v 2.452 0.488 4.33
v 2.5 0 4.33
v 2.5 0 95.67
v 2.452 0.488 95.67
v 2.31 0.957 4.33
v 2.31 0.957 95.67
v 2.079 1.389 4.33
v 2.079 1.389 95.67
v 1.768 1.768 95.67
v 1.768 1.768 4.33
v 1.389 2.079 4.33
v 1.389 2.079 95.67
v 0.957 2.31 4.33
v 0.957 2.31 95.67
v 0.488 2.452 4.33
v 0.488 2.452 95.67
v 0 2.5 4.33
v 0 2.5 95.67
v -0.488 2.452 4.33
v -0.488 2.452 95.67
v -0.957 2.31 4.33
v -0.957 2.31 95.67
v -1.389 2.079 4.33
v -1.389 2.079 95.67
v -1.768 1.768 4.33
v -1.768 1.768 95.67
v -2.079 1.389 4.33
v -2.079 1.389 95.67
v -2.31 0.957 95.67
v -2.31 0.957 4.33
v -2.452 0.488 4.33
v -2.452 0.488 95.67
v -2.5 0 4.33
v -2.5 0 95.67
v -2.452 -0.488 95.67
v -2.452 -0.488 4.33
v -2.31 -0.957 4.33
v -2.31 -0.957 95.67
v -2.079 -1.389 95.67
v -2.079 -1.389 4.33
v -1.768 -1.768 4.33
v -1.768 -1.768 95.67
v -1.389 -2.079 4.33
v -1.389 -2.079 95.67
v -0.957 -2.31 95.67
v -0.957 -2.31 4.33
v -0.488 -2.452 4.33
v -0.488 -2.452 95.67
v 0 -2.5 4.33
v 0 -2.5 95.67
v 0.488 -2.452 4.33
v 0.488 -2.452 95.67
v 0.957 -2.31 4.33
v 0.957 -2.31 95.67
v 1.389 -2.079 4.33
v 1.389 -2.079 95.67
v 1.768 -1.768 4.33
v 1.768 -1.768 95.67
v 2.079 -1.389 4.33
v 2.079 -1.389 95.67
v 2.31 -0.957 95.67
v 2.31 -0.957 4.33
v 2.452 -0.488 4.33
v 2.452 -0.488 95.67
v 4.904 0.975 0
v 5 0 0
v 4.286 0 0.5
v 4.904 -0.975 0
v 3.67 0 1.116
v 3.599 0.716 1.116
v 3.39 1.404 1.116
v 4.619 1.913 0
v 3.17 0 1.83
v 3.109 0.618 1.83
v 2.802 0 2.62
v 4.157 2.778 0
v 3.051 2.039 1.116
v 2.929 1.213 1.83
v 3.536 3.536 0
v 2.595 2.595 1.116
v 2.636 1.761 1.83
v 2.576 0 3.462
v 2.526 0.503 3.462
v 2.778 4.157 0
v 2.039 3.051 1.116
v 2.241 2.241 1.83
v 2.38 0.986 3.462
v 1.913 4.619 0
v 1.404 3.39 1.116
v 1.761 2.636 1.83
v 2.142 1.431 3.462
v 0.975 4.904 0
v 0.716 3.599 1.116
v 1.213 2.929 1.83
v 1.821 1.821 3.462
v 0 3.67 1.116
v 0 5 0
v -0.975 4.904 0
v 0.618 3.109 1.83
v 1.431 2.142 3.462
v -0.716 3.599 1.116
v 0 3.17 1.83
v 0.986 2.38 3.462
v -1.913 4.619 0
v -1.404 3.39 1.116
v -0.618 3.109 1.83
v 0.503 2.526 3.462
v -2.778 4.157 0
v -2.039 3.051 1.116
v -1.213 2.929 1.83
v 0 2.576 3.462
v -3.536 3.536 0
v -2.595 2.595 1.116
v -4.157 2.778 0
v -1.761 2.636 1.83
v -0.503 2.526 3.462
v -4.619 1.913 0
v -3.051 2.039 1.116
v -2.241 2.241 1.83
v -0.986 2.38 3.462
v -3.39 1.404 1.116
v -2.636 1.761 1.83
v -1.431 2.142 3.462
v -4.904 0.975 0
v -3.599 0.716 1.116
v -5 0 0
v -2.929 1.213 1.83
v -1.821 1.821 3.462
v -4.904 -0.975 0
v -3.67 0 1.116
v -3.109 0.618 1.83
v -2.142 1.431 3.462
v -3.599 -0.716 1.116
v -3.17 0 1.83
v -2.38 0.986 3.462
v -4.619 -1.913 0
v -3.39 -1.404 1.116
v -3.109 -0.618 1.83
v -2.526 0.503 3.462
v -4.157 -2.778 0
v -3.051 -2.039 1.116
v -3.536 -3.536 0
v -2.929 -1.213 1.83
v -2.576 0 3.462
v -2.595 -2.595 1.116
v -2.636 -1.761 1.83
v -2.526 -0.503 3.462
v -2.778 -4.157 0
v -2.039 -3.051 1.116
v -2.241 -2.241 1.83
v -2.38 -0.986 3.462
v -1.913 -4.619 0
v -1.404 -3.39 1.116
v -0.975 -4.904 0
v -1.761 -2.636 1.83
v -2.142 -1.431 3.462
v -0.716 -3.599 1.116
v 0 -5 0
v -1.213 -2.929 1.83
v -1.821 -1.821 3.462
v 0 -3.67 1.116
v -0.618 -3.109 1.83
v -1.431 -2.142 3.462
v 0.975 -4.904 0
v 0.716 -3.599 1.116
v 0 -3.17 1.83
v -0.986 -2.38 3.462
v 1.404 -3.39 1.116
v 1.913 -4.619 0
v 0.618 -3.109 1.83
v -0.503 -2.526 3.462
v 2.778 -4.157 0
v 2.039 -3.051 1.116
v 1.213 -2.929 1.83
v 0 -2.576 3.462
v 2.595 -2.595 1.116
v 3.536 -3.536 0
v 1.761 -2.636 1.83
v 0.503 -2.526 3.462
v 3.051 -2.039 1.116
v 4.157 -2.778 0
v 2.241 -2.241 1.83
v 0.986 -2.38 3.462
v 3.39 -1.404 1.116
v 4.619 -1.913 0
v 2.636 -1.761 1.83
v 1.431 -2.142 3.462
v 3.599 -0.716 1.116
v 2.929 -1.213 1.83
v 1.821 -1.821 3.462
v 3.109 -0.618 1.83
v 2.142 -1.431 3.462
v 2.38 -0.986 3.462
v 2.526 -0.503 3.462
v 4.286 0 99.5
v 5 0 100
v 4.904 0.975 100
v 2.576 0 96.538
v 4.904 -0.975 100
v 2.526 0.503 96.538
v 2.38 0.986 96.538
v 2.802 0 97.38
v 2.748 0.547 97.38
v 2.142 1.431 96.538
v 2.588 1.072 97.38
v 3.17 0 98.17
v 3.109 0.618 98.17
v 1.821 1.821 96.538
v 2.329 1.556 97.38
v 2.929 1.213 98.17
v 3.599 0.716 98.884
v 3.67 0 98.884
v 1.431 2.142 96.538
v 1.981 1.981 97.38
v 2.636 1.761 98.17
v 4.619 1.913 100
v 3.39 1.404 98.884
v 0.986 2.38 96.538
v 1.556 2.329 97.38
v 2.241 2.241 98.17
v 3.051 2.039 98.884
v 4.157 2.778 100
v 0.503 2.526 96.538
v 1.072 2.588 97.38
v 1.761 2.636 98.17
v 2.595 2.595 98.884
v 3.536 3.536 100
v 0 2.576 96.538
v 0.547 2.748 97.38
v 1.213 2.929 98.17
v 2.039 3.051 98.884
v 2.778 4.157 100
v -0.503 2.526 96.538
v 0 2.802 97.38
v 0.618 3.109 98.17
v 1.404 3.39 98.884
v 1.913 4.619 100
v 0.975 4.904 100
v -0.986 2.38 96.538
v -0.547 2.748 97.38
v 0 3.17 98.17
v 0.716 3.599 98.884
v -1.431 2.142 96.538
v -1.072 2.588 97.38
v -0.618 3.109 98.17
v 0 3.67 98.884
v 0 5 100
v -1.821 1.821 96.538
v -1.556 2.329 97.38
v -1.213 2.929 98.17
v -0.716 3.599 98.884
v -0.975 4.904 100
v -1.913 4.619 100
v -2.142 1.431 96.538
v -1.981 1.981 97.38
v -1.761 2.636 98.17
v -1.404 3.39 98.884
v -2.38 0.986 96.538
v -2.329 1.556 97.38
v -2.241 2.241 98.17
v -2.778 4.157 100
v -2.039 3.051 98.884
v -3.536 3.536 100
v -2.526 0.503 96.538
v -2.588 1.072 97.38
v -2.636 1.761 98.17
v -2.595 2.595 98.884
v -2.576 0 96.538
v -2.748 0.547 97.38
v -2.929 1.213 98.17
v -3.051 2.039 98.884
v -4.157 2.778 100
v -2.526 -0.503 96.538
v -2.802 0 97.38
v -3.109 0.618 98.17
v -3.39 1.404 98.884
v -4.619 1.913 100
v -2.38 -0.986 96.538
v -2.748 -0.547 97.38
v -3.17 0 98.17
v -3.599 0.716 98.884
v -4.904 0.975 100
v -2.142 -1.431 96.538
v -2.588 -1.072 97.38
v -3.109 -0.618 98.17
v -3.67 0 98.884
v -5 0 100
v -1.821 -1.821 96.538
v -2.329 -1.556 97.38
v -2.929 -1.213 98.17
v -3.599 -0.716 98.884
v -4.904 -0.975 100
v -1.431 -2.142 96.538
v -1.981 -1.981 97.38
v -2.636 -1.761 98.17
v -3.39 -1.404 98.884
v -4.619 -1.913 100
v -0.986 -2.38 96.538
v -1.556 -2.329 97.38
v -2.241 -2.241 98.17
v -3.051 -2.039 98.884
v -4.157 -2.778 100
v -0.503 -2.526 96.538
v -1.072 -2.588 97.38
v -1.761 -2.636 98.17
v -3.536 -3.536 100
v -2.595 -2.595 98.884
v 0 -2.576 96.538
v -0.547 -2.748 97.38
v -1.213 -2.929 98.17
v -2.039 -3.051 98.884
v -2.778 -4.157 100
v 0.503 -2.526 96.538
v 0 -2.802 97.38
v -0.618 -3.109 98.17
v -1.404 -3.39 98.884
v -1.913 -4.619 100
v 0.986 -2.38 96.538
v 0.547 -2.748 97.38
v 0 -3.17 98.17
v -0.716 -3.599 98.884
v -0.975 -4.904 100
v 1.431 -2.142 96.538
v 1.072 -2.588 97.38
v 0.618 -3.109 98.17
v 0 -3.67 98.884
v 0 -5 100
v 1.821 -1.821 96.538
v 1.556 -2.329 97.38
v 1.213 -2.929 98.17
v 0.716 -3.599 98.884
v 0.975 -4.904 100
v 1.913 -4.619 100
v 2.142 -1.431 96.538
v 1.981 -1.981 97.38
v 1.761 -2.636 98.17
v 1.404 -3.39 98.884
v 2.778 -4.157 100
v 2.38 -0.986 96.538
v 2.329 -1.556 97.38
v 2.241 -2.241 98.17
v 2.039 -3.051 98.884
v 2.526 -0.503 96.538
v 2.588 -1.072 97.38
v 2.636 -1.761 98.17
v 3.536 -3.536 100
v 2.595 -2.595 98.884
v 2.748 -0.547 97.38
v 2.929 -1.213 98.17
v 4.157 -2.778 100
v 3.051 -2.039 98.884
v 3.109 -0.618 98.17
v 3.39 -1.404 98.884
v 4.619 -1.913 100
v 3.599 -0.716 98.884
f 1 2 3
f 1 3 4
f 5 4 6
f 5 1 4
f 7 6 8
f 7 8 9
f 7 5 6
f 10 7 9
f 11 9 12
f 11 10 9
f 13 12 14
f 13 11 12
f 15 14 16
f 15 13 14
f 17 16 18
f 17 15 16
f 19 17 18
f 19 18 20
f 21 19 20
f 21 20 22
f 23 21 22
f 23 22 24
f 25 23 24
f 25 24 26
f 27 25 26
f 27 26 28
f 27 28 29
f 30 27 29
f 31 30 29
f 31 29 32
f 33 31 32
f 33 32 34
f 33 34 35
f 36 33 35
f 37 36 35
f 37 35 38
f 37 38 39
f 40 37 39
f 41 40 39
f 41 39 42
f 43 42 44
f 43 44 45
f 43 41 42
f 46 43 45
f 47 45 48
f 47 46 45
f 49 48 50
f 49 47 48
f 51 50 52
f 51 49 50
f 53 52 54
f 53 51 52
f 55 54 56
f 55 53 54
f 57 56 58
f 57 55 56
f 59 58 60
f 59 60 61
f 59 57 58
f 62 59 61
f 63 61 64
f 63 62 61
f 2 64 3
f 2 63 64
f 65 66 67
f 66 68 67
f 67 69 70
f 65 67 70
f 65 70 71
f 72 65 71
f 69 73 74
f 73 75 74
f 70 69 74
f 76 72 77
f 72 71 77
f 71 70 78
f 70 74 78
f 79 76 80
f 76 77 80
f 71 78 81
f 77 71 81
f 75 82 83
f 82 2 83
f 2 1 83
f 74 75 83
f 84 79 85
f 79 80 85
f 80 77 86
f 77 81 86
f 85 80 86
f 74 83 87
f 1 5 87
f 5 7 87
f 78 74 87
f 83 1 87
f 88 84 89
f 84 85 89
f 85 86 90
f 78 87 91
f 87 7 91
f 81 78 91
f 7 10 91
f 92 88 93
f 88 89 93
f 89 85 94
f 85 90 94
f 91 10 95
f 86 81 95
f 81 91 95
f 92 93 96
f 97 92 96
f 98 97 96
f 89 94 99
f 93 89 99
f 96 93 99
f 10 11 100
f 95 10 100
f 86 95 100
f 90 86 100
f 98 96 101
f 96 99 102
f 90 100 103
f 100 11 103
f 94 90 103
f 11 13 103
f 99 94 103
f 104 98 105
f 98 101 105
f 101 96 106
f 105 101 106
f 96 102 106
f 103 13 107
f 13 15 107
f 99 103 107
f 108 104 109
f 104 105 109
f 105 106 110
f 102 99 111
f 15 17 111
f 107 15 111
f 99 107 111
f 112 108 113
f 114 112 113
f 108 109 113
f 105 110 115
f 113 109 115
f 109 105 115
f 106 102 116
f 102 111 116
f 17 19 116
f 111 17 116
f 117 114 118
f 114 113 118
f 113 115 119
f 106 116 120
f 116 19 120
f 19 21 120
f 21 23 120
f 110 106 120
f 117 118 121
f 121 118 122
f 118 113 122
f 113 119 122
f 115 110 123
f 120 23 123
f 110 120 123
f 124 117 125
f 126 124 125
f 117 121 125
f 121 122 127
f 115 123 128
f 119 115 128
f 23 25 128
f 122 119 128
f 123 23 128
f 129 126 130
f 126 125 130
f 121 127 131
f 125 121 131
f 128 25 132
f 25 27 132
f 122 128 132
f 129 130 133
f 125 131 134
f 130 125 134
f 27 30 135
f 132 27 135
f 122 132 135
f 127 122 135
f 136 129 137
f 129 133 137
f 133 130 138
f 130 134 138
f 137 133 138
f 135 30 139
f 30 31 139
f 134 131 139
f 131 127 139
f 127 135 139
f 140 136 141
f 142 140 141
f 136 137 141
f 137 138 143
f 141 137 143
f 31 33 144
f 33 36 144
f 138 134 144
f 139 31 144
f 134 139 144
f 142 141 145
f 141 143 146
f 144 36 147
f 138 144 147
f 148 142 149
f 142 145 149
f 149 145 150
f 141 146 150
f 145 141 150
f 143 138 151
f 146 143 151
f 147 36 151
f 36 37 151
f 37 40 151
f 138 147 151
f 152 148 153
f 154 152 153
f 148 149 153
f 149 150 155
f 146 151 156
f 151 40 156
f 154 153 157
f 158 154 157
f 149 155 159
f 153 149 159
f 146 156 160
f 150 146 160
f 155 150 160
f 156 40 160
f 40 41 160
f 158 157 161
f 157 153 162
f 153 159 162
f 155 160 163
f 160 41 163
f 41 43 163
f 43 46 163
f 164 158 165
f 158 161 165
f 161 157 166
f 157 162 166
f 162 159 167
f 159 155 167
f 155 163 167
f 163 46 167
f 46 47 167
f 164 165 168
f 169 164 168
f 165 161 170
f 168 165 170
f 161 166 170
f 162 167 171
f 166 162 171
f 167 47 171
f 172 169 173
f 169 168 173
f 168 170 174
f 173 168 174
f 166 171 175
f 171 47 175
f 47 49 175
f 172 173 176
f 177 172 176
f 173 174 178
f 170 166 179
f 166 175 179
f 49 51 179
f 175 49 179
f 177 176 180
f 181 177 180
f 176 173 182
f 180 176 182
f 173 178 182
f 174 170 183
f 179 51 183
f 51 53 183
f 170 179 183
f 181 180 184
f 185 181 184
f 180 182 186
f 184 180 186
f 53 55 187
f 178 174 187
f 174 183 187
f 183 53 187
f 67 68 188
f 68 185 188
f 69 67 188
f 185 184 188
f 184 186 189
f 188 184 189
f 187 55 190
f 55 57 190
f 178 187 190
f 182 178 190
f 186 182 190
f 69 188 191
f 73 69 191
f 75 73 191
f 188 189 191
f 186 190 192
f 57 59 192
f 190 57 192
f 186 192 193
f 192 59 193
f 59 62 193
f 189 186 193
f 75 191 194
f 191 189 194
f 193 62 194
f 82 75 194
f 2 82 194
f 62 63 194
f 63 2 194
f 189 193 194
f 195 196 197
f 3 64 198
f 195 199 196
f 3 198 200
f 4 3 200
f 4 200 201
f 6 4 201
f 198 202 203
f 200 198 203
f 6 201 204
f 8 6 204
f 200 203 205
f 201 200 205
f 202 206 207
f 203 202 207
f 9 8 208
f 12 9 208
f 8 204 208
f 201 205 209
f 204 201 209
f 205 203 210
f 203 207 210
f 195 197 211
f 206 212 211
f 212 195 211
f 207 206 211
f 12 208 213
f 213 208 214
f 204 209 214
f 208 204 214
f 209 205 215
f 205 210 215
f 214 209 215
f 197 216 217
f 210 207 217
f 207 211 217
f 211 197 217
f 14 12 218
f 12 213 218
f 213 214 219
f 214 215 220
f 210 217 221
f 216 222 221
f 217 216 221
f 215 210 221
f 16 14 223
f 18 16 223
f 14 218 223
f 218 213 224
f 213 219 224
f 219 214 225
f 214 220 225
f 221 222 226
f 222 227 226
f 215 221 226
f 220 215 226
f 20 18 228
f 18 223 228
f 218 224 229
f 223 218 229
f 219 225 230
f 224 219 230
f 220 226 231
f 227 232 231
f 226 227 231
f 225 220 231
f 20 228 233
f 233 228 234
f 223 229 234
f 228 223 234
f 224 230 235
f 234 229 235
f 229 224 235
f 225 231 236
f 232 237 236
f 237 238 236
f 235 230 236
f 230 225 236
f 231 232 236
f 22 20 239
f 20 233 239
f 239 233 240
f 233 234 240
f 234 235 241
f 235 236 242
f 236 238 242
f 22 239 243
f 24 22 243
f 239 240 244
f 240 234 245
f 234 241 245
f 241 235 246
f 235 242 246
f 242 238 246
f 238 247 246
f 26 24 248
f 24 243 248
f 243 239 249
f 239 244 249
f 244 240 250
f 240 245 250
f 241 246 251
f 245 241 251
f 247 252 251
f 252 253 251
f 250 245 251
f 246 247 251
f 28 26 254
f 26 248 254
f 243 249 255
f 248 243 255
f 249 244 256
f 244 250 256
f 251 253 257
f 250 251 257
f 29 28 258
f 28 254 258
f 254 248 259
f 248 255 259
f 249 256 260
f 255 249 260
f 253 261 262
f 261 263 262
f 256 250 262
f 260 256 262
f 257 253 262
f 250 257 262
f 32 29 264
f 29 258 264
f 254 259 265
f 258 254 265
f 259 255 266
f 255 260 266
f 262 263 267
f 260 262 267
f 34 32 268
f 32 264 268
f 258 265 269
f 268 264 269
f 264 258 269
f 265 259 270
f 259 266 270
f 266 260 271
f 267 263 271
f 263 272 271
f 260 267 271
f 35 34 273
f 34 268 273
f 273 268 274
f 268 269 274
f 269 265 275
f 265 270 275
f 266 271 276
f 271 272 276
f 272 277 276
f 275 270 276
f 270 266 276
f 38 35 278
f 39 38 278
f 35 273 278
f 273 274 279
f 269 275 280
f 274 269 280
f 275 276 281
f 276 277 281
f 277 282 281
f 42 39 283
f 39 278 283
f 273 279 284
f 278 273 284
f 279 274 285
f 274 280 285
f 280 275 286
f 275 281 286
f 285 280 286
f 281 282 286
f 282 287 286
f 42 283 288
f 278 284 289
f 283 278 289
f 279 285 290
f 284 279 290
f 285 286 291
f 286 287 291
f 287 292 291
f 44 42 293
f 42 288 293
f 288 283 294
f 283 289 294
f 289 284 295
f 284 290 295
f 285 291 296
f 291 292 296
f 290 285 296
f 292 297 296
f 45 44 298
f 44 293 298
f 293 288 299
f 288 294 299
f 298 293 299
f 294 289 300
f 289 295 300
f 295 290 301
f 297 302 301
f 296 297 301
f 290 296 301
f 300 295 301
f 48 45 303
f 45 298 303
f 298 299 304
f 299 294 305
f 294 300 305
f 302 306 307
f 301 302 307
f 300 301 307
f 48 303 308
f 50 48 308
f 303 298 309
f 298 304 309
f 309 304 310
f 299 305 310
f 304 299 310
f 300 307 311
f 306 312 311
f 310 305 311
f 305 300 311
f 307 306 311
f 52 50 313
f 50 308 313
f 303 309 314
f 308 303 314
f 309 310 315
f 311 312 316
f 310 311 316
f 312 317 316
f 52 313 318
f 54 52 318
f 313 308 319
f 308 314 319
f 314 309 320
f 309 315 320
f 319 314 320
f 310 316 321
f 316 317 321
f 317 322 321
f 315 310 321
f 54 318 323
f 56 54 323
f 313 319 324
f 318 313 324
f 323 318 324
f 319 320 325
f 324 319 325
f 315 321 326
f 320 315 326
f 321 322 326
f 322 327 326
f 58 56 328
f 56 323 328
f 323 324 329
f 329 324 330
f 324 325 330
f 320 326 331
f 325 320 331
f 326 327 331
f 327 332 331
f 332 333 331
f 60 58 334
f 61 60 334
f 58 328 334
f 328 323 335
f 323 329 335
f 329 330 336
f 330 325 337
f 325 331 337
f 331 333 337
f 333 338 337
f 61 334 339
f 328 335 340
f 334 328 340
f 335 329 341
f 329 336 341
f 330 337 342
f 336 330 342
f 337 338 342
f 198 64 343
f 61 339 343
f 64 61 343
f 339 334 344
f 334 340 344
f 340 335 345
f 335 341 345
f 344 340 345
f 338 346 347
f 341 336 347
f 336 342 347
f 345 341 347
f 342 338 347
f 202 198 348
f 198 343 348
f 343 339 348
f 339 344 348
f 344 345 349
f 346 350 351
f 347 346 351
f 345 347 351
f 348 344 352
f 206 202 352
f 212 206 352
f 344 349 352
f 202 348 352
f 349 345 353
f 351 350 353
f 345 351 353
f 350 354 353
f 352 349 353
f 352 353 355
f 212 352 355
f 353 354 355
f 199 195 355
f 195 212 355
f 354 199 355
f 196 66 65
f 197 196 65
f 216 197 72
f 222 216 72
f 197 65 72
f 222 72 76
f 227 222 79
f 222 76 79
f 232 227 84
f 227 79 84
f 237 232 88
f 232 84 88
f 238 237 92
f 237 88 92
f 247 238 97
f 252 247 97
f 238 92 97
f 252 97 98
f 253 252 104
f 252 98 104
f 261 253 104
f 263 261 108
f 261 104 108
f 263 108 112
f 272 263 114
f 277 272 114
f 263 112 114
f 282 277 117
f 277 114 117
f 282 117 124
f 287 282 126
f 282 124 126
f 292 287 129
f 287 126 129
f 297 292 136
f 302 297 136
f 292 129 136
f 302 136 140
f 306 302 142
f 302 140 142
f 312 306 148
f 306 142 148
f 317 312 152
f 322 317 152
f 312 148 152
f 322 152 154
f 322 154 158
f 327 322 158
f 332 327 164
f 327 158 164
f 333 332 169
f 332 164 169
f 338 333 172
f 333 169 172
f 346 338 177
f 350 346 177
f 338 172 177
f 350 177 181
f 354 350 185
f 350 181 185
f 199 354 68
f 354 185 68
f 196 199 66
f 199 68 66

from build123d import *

# Parameters (mm, degrees)
F0_R     = 5
F0_R_2   = 2.5
F1_DEPTH = 100


# Not quite as in the source:
# - a fillet or chamfer that OpenCascade refuses, or shapes differently, is made with other operations: its cross-section is extruded or revolved along the edge and cut away or added


with BuildPart() as f1:
    # F0 (on Top) → F1 (new body)
    with BuildSketch(Plane.XY):
        Circle(F0_R)
        Circle(F0_R_2, mode=Mode.SUBTRACT)
    extrude(amount=F1_DEPTH)

    # F2: fillet of radius 5 on 1 edges, made by hand

    # F2_s1 → F2_t2 (revolve, cut)
    with BuildSketch(Plane.XZ):
        with BuildLine():
            ThreePointArc((2.5, 95.6698729811), (3.1698729811, 98.1698729811), (5, 100))
            Line((5, 100), (2.5, 100))
            Line((2.5, 100), (2.5, 95.6698729811))
        make_face()
    revolve(axis=Axis((0, 0, 100), (0, 0, 1)), mode=Mode.SUBTRACT)

    # F3: fillet of radius 5 on 1 edges, made by hand

    # F3_s1 → F3_t2 (revolve, cut)
    with BuildSketch(Plane.XZ):
        with BuildLine():
            ThreePointArc((5, 0), (3.1698729811, 1.8301270189), (2.5, 4.3301270189))
            Line((2.5, 4.3301270189), (2.5, 0))
            Line((2.5, 0), (5, 0))
        make_face()
    revolve(axis=Axis((0, 0, 0), (0, 0, 1)), mode=Mode.SUBTRACT)


solid = f1.part
